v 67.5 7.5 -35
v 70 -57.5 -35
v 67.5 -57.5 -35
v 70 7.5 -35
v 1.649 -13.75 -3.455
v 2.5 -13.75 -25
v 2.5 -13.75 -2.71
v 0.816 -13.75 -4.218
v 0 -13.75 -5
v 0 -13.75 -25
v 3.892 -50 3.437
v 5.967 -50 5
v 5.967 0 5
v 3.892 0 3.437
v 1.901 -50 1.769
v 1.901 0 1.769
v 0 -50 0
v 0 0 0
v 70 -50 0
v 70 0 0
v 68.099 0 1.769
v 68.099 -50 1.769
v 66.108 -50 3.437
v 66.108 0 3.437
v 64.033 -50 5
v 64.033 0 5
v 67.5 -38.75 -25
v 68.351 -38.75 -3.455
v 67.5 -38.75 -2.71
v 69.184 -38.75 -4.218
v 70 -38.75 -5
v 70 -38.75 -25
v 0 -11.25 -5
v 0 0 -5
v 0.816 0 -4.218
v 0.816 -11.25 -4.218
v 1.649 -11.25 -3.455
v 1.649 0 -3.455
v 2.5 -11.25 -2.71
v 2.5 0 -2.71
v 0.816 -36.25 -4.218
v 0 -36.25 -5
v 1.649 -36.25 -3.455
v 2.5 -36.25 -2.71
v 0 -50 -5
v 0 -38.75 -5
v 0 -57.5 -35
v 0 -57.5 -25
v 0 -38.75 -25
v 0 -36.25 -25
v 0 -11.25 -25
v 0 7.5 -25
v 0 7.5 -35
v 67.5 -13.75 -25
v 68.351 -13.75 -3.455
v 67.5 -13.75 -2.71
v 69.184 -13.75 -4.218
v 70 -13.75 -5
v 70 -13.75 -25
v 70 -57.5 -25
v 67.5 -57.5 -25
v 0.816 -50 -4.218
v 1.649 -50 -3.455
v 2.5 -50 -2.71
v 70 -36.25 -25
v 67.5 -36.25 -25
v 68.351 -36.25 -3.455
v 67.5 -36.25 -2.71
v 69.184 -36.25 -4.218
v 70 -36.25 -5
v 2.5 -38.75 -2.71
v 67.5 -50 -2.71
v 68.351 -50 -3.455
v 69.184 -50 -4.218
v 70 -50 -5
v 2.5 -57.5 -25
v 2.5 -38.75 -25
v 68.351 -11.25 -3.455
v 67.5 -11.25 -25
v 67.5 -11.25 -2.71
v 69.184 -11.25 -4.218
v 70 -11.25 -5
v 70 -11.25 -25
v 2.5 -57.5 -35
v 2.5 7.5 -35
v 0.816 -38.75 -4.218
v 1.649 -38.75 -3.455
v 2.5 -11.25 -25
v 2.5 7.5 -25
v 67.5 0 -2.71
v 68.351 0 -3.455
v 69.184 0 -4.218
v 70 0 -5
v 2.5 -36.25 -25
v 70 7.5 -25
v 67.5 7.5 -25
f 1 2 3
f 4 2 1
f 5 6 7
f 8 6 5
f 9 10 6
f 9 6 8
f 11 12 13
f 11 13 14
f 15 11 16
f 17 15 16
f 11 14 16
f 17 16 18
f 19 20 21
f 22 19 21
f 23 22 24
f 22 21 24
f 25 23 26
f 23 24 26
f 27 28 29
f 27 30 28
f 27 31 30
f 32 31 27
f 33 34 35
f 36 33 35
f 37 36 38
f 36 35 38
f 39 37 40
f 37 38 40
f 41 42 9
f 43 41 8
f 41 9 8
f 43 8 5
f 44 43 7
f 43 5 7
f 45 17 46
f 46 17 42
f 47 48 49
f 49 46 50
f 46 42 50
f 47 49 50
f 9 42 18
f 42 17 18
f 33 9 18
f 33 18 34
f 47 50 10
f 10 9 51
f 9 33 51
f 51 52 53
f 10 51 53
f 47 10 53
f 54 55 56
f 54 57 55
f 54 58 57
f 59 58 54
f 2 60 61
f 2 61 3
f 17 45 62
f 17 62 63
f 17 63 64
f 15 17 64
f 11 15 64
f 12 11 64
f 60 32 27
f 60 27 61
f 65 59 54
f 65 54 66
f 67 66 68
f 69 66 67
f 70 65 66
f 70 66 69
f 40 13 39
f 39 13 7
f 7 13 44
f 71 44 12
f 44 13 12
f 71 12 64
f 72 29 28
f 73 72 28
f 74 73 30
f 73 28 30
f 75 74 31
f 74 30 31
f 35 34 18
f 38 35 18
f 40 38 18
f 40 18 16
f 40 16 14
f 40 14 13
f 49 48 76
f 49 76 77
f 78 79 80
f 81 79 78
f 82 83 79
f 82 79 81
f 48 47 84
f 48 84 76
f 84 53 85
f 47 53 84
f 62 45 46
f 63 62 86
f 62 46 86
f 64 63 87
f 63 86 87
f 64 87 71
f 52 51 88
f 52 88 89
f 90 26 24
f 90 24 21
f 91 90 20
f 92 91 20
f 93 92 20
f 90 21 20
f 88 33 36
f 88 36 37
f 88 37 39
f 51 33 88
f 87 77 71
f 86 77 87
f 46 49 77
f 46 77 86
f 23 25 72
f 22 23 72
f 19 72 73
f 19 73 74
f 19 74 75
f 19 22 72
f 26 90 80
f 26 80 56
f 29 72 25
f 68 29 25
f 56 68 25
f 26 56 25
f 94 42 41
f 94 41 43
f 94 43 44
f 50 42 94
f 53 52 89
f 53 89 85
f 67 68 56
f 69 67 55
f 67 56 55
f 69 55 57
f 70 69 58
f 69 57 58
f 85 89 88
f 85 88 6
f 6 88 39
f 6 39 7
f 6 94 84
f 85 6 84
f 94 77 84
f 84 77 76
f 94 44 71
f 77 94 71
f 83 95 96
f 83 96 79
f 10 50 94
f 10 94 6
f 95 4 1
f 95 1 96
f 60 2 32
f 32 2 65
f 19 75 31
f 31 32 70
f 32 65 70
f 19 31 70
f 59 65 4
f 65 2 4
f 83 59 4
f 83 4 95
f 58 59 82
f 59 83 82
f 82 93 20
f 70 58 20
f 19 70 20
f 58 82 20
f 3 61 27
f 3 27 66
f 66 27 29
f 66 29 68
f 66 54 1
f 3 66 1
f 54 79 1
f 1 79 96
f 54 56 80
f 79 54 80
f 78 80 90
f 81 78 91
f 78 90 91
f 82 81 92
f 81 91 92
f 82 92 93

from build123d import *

# Parameters (mm, degrees)
F1_DEPTH = 50
F2_W     = 2.5
F2_H     = 5
F3_DEPTH = 2.5
F4_W     = 2.5
F4_H     = 5
F5_DEPTH = 2.5
F7_DEPTH = 50


with BuildPart() as f1:
    # F0 (on Front) → F1 (new body)
    with BuildSketch(Plane.XZ):
        with BuildLine():
            Line((70, -5), (70, 0))
            ThreePointArc((70, 0), (35, 14.2928578573), (0, 0))
            Line((0, 0), (0, -5))
            ThreePointArc((0, -5), (35, 9.2928578573), (70, -5))
        make_face()
    extrude(amount=F1_DEPTH)

    # F2 (on face) → F3 (join)
    with BuildSketch(Plane.YZ.offset(70)):
        with BuildLine():
            Line((-38.75, -2.5), (-38.75, -5))
            Line((-38.75, -5), (-38.75, -25))
            Line((-38.75, -25), (-36.25, -25))
            Line((-36.25, -25), (-36.25, -5))
            Line((-36.25, -5), (-36.25, -2.5))
            ThreePointArc((-36.25, -2.5), (-37.5, -3.75), (-38.75, -2.5))
        make_face()
        with Locations((-37.5, -27.5)):
            Rectangle(F2_W, F2_H)
        Polygon((-38.75, -30), (-38.75, -25), (-57.5, -25), (-57.5, -30), (-57.5, -35), (7.5, -35), (7.5, -30), (7.5, -25), (-11.25, -25), (-11.25, -30), (-13.75, -30), (-13.75, -25), (-36.25, -25), (-36.25, -30), align=None)
        with BuildLine():
            ThreePointArc((-36.25, -2.5), (-37.5, -1.25), (-38.75, -2.5))
            Line((-38.75, -2.5), (-36.25, -2.5))
        make_face()
        with BuildLine():
            Line((-36.25, -2.5), (-38.75, -2.5))
            ThreePointArc((-38.75, -2.5), (-37.5, -3.75), (-36.25, -2.5))
        make_face()
        with Locations((-12.5, -27.5)):
            Rectangle(F2_W, F2_H)
        with BuildLine():
            Line((-13.75, -5), (-13.75, -25))
            Line((-13.75, -25), (-11.25, -25))
            Line((-11.25, -25), (-11.25, -5))
            Line((-11.25, -5), (-11.25, -2.5))
            ThreePointArc((-11.25, -2.5), (-12.5, -3.75), (-13.75, -2.5))
            Line((-13.75, -2.5), (-13.75, -5))
        make_face()
        with BuildLine():
            ThreePointArc((-11.25, -2.5), (-12.5, -1.25), (-13.75, -2.5))
            Line((-13.75, -2.5), (-11.25, -2.5))
        make_face()
        with BuildLine():
            Line((-11.25, -2.5), (-13.75, -2.5))
            ThreePointArc((-13.75, -2.5), (-12.5, -3.75), (-11.25, -2.5))
        make_face()
    extrude(amount=-F3_DEPTH)

    # F4 (on face) → F5 (join)
    with BuildSketch(Plane(origin=(0, 0, 0), x_dir=(0, -1, 0), z_dir=(-1, 0, 0))):
        with BuildLine():
            Line((11.25, -2.5), (11.25, -5))
            Line((11.25, -5), (11.25, -25))
            Line((11.25, -25), (13.75, -25))
            Line((13.75, -25), (13.75, -5))
            Line((13.75, -5), (13.75, -2.5))
            ThreePointArc((13.75, -2.5), (12.5, -3.75), (11.25, -2.5))
        make_face()
        with Locations((12.5, -27.5)):
            Rectangle(F4_W, F4_H)
        Polygon((11.25, -30), (11.25, -25), (-7.5, -25), (-7.5, -30), (-7.5, -35), (57.5, -35), (57.5, -30), (57.5, -25), (38.75, -25), (38.75, -30), (36.25, -30), (36.25, -25), (13.75, -25), (13.75, -30), align=None)
        with BuildLine():
            ThreePointArc((13.75, -2.5), (12.5, -1.25), (11.25, -2.5))
            Line((11.25, -2.5), (13.75, -2.5))
        make_face()
        with BuildLine():
            Line((13.75, -2.5), (11.25, -2.5))
            ThreePointArc((11.25, -2.5), (12.5, -3.75), (13.75, -2.5))
        make_face()
        with Locations((37.5, -27.5)):
            Rectangle(F4_W, F4_H)
        with BuildLine():
            Line((36.25, -5), (36.25, -25))
            Line((36.25, -25), (38.75, -25))
            Line((38.75, -25), (38.75, -2.5))
            ThreePointArc((38.75, -2.5), (37.5, -3.75), (36.25, -2.5))
            Line((36.25, -2.5), (36.25, -5))
        make_face()
        with BuildLine():
            ThreePointArc((38.75, -2.5), (37.5, -1.25), (36.25, -2.5))
            Line((36.25, -2.5), (38.75, -2.5))
        make_face()
        with BuildLine():
            Line((38.75, -2.5), (36.25, -2.5))
            ThreePointArc((36.25, -2.5), (37.5, -3.75), (38.75, -2.5))
        make_face()
    extrude(amount=-F5_DEPTH)

    # F6 (on face) → F7 (cut)
    with BuildSketch(Plane.XZ.offset(50)):
        with BuildLine():
            Line((5.9667676864, 5), (2.5, -2.7104317588))
            ThreePointArc((2.5, -2.7104317588), (35, 9.2928578573), (67.5, -2.7104317588))
            Line((67.5, -2.7104317588), (64.0332323136, 5))
            ThreePointArc((64.0332323136, 5), (35, 14.2928578573), (5.9667676864, 5))
        make_face()
    extrude(amount=-F7_DEPTH, mode=Mode.SUBTRACT)


solid = f1.part
